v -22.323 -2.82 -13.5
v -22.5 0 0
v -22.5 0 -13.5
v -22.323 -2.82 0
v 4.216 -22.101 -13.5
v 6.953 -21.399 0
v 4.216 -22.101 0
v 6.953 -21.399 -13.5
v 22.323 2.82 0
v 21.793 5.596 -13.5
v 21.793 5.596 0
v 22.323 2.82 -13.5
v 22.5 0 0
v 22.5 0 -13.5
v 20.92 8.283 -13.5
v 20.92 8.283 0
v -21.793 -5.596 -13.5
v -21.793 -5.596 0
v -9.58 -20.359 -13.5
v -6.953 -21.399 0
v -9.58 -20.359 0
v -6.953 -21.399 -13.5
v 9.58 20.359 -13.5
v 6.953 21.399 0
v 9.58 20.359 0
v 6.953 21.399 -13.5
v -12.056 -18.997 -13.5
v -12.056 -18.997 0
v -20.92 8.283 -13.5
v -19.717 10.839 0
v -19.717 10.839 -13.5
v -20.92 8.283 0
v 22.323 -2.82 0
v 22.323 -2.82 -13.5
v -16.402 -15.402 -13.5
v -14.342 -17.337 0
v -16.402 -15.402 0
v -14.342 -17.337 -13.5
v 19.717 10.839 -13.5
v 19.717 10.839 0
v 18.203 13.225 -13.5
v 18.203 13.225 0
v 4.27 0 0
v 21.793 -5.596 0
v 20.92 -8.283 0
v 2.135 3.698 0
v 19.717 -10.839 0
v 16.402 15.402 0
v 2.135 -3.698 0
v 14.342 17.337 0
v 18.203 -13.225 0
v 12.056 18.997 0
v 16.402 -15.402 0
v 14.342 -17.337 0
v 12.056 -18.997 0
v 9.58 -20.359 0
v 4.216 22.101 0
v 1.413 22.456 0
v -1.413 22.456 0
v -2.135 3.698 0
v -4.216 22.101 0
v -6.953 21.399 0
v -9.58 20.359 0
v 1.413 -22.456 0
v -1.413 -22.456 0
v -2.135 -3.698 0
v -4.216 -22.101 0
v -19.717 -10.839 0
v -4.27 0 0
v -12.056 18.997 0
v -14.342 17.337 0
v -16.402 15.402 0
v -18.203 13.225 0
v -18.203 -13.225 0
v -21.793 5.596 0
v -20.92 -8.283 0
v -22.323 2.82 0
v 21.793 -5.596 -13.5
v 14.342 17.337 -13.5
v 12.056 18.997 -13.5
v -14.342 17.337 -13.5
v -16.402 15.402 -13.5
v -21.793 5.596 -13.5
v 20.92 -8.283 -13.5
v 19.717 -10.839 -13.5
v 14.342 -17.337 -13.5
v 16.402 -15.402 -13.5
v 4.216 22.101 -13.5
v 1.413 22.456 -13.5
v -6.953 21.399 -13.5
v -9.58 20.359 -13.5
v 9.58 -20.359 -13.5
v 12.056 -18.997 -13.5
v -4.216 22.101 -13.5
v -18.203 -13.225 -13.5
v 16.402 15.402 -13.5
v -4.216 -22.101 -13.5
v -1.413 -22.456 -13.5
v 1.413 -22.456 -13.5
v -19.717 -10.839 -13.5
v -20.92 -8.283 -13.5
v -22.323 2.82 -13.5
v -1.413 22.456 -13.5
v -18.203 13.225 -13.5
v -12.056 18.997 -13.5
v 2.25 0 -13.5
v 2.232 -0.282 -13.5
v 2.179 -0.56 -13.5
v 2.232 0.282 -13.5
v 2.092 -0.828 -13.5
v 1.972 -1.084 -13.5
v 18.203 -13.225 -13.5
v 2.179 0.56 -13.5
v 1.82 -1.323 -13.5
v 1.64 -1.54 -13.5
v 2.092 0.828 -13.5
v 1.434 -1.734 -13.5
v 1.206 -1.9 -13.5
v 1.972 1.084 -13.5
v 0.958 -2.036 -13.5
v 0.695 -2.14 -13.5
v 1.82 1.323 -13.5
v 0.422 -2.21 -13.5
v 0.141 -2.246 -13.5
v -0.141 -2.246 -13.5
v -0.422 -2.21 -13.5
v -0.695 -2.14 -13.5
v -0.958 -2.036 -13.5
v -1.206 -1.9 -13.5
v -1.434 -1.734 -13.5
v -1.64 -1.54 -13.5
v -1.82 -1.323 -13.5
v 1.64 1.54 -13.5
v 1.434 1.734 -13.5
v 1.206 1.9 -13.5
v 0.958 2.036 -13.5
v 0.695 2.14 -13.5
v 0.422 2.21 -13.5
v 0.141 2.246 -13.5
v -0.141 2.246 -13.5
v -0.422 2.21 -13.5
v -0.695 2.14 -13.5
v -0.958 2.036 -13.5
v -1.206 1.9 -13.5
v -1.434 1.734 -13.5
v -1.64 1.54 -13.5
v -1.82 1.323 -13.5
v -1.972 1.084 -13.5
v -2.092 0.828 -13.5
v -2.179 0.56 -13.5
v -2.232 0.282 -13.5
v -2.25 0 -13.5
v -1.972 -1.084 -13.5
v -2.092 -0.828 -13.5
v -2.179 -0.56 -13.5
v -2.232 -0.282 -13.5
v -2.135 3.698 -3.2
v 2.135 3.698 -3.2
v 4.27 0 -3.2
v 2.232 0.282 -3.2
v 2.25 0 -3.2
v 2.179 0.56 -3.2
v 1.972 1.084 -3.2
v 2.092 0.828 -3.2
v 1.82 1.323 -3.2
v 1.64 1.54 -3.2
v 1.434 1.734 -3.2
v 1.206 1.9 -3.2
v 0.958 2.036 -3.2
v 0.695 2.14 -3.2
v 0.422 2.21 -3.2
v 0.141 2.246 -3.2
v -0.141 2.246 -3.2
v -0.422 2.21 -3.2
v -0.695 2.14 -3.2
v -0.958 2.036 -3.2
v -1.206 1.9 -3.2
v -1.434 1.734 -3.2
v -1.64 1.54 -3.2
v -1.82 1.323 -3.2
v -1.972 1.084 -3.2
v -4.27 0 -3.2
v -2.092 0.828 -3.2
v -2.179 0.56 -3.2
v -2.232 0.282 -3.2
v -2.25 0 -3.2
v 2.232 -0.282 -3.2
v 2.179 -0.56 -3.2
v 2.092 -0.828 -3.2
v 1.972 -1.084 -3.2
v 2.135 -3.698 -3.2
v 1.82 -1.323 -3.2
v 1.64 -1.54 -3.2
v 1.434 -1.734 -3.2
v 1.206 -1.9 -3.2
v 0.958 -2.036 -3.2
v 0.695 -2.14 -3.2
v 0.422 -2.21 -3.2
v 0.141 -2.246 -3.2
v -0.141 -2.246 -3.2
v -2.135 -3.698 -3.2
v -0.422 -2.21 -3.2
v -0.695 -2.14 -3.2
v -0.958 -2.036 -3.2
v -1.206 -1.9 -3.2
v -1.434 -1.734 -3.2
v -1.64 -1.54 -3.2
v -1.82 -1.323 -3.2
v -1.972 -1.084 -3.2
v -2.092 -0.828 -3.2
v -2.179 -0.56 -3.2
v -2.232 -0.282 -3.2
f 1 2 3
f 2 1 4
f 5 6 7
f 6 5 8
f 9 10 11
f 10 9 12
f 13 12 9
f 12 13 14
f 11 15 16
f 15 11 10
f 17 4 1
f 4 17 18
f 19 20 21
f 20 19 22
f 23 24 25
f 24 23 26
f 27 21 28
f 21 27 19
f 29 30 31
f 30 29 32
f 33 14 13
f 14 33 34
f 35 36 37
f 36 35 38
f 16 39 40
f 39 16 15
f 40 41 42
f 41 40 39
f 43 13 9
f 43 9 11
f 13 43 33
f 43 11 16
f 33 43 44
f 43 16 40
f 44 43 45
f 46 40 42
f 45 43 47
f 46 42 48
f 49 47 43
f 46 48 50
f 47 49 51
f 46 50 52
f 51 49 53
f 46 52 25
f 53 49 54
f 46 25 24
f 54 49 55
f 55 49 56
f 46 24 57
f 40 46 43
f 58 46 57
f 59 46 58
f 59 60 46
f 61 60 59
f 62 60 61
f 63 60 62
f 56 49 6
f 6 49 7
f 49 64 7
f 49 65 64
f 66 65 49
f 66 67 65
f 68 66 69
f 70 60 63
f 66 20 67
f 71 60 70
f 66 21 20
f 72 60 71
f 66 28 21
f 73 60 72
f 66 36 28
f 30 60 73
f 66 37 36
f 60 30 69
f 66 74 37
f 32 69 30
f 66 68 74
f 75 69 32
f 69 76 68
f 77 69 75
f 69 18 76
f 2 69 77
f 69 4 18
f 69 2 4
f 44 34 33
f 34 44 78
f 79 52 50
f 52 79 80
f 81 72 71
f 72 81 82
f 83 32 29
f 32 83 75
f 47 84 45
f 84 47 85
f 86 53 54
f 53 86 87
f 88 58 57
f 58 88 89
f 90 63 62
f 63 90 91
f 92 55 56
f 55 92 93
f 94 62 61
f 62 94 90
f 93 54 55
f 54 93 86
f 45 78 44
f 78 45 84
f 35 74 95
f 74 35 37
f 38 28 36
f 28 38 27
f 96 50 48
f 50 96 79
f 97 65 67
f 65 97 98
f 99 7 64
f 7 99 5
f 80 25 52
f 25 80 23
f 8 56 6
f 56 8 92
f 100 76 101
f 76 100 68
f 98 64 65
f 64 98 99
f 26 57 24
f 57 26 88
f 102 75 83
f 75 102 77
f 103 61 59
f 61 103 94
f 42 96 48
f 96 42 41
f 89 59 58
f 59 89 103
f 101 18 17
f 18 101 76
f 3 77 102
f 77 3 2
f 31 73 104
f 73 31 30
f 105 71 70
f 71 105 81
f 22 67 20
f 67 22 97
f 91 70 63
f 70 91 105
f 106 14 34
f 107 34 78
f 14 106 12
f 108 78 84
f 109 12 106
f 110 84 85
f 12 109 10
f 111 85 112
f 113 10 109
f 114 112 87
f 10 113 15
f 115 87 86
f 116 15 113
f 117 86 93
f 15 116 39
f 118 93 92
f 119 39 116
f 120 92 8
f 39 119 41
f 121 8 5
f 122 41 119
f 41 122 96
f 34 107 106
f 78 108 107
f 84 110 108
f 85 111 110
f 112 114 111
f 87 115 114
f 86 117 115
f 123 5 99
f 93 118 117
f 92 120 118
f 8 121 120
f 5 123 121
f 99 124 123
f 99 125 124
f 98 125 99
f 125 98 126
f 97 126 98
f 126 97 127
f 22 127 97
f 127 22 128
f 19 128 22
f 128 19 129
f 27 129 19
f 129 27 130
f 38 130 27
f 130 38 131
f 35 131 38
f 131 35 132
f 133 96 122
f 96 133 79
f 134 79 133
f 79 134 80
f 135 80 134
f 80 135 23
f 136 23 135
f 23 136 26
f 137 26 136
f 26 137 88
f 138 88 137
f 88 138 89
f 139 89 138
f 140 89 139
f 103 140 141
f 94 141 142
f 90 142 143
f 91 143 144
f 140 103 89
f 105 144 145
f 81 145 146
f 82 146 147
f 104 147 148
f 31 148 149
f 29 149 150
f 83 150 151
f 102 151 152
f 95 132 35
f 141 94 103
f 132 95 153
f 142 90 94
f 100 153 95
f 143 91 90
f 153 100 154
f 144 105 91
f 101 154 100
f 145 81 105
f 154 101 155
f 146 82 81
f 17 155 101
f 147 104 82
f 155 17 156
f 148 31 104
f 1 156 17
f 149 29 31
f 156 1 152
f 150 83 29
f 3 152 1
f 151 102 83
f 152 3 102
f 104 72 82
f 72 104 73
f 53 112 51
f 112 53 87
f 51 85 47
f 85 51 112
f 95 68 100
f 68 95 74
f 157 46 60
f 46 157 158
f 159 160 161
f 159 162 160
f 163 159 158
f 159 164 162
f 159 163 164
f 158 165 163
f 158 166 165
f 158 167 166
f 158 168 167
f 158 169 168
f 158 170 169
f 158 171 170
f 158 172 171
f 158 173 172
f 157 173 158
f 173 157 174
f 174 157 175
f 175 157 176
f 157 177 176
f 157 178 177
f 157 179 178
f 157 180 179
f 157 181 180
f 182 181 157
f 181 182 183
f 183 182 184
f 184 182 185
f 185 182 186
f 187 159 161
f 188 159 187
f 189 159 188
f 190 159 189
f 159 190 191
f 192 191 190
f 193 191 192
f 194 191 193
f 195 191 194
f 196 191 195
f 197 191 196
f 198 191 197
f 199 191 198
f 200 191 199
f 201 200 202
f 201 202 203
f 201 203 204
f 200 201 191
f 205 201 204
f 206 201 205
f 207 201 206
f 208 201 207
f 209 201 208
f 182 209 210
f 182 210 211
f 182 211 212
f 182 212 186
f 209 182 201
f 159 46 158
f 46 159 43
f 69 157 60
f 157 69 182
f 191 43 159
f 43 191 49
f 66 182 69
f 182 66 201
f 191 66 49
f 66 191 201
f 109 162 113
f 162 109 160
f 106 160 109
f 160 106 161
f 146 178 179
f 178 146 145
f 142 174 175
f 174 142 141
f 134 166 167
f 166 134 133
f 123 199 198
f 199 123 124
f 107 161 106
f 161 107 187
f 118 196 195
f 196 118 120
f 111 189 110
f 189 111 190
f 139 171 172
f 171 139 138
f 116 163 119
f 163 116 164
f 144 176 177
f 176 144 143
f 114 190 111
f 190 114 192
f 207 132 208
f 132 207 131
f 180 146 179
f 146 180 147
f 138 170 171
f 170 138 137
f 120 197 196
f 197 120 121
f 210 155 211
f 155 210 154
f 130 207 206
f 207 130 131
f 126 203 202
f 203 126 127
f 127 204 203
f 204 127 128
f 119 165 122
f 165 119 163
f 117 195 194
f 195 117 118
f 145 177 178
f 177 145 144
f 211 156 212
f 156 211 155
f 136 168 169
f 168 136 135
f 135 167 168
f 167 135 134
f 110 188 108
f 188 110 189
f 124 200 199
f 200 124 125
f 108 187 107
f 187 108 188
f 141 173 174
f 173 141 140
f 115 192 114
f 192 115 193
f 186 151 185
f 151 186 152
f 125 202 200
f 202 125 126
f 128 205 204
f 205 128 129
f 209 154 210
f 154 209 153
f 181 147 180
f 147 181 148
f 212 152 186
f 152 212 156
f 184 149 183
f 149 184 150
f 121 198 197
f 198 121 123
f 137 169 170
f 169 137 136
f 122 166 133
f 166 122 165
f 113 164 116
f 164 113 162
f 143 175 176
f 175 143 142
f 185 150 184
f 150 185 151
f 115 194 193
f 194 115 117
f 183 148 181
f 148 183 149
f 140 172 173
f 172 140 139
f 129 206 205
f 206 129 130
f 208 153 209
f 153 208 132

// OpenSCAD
$fn = 50;


difference() {
	union() {
		translate(v = [0, 0, -13.5000000000]) {
			cylinder(h = 13.5000000000, r = 22.5000000000);
		}
		translate(v = [0, 0, -12.0000000000]) {
			cylinder(h = 12, r = 2.8750000000);
		}
	}
	union() {
		translate(v = [0, 0, 0]) {
			rotate(a = [0, 0, 0]) {
				difference() {
					union() {
						translate(v = [0, 0, -3.2000000000]) {
							linear_extrude(height = 3.2000000000) {
								polygon(points = [[4.2698000000, 0.0000000000], [2.1349000000, 3.6977552691], [-2.1349000000, 3.6977552691], [-4.2698000000, 0.0000000000], [-2.1349000000, -3.6977552691], [2.1349000000, -3.6977552691]]);
							}
						}
					}
					union();
				}
			}
		}
		#translate(v = [0, 0, -100.0000000000]) {
			cylinder(h = 200, r = 2.2500000000);
		}
	}
}
